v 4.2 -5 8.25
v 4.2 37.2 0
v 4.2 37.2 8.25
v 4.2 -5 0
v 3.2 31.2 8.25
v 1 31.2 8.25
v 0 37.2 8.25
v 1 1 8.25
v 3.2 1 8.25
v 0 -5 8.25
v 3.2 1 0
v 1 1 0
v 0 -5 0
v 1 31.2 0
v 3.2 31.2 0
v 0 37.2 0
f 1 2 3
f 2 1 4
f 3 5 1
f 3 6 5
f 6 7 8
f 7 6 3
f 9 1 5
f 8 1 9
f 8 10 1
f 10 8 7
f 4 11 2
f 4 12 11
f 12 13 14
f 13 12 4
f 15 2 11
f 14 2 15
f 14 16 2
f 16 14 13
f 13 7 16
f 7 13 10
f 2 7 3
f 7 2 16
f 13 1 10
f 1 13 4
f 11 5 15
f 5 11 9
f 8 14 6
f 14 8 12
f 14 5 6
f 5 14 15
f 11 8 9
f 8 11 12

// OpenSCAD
/*

Creator
*****************

Constantin Ganshin

Project name:
*****************
hole_narrower_for_toothbrush_holder_with_clip

Description:
****************************************
Making the hole for toothbrush (the tothbrash holder) adjustable, designed for Tooth_brush_Holder_With_Clip.scad and Tooth_brush_Holder_With_Clip.scad

- Adding another improvement: adding handles on each side for easier movement of the narrower and making it little bit smaller (in z plane)

Printed in PETG (for water resistance)

*/

// Resolution variables
$fa = 1;
$fs = 0.4;

// Main dimension variables
toothbrushHolderLengthWidth = 30;
original_plate_thickness = 2; // Thickness of the original plate/wall
current_walls_thickness = 1; // Thickness of current walls
holeForToothbrushD = 19;
protection_factor_final = 0.10; // This is the currect protection factor
handle_y = 5;

// Calculations
gap_between_hole_and_wall_z = ((toothbrushHolderLengthWidth / 2) - (holeForToothbrushD / 2)) * 1.5; // narrower could have been just ~5/6 (without any calculations)

// Main
module hole_narrower(protection_factor){
    additional_cube_thickness = current_walls_thickness + protection_factor;
    difference(){
        // Body
        translate([0, - handle_y, 0])
            cube([original_plate_thickness + (additional_cube_thickness * 2), toothbrushHolderLengthWidth + (additional_cube_thickness * 2) + (2 * handle_y), gap_between_hole_and_wall_z]);
        // Hole
        translate([current_walls_thickness, current_walls_thickness, -1])
            cube([original_plate_thickness + (protection_factor * 2), toothbrushHolderLengthWidth + (protection_factor * 2), gap_between_hole_and_wall_z + 2]);
    }
}

// Generate the module
hole_narrower(protection_factor_final);
